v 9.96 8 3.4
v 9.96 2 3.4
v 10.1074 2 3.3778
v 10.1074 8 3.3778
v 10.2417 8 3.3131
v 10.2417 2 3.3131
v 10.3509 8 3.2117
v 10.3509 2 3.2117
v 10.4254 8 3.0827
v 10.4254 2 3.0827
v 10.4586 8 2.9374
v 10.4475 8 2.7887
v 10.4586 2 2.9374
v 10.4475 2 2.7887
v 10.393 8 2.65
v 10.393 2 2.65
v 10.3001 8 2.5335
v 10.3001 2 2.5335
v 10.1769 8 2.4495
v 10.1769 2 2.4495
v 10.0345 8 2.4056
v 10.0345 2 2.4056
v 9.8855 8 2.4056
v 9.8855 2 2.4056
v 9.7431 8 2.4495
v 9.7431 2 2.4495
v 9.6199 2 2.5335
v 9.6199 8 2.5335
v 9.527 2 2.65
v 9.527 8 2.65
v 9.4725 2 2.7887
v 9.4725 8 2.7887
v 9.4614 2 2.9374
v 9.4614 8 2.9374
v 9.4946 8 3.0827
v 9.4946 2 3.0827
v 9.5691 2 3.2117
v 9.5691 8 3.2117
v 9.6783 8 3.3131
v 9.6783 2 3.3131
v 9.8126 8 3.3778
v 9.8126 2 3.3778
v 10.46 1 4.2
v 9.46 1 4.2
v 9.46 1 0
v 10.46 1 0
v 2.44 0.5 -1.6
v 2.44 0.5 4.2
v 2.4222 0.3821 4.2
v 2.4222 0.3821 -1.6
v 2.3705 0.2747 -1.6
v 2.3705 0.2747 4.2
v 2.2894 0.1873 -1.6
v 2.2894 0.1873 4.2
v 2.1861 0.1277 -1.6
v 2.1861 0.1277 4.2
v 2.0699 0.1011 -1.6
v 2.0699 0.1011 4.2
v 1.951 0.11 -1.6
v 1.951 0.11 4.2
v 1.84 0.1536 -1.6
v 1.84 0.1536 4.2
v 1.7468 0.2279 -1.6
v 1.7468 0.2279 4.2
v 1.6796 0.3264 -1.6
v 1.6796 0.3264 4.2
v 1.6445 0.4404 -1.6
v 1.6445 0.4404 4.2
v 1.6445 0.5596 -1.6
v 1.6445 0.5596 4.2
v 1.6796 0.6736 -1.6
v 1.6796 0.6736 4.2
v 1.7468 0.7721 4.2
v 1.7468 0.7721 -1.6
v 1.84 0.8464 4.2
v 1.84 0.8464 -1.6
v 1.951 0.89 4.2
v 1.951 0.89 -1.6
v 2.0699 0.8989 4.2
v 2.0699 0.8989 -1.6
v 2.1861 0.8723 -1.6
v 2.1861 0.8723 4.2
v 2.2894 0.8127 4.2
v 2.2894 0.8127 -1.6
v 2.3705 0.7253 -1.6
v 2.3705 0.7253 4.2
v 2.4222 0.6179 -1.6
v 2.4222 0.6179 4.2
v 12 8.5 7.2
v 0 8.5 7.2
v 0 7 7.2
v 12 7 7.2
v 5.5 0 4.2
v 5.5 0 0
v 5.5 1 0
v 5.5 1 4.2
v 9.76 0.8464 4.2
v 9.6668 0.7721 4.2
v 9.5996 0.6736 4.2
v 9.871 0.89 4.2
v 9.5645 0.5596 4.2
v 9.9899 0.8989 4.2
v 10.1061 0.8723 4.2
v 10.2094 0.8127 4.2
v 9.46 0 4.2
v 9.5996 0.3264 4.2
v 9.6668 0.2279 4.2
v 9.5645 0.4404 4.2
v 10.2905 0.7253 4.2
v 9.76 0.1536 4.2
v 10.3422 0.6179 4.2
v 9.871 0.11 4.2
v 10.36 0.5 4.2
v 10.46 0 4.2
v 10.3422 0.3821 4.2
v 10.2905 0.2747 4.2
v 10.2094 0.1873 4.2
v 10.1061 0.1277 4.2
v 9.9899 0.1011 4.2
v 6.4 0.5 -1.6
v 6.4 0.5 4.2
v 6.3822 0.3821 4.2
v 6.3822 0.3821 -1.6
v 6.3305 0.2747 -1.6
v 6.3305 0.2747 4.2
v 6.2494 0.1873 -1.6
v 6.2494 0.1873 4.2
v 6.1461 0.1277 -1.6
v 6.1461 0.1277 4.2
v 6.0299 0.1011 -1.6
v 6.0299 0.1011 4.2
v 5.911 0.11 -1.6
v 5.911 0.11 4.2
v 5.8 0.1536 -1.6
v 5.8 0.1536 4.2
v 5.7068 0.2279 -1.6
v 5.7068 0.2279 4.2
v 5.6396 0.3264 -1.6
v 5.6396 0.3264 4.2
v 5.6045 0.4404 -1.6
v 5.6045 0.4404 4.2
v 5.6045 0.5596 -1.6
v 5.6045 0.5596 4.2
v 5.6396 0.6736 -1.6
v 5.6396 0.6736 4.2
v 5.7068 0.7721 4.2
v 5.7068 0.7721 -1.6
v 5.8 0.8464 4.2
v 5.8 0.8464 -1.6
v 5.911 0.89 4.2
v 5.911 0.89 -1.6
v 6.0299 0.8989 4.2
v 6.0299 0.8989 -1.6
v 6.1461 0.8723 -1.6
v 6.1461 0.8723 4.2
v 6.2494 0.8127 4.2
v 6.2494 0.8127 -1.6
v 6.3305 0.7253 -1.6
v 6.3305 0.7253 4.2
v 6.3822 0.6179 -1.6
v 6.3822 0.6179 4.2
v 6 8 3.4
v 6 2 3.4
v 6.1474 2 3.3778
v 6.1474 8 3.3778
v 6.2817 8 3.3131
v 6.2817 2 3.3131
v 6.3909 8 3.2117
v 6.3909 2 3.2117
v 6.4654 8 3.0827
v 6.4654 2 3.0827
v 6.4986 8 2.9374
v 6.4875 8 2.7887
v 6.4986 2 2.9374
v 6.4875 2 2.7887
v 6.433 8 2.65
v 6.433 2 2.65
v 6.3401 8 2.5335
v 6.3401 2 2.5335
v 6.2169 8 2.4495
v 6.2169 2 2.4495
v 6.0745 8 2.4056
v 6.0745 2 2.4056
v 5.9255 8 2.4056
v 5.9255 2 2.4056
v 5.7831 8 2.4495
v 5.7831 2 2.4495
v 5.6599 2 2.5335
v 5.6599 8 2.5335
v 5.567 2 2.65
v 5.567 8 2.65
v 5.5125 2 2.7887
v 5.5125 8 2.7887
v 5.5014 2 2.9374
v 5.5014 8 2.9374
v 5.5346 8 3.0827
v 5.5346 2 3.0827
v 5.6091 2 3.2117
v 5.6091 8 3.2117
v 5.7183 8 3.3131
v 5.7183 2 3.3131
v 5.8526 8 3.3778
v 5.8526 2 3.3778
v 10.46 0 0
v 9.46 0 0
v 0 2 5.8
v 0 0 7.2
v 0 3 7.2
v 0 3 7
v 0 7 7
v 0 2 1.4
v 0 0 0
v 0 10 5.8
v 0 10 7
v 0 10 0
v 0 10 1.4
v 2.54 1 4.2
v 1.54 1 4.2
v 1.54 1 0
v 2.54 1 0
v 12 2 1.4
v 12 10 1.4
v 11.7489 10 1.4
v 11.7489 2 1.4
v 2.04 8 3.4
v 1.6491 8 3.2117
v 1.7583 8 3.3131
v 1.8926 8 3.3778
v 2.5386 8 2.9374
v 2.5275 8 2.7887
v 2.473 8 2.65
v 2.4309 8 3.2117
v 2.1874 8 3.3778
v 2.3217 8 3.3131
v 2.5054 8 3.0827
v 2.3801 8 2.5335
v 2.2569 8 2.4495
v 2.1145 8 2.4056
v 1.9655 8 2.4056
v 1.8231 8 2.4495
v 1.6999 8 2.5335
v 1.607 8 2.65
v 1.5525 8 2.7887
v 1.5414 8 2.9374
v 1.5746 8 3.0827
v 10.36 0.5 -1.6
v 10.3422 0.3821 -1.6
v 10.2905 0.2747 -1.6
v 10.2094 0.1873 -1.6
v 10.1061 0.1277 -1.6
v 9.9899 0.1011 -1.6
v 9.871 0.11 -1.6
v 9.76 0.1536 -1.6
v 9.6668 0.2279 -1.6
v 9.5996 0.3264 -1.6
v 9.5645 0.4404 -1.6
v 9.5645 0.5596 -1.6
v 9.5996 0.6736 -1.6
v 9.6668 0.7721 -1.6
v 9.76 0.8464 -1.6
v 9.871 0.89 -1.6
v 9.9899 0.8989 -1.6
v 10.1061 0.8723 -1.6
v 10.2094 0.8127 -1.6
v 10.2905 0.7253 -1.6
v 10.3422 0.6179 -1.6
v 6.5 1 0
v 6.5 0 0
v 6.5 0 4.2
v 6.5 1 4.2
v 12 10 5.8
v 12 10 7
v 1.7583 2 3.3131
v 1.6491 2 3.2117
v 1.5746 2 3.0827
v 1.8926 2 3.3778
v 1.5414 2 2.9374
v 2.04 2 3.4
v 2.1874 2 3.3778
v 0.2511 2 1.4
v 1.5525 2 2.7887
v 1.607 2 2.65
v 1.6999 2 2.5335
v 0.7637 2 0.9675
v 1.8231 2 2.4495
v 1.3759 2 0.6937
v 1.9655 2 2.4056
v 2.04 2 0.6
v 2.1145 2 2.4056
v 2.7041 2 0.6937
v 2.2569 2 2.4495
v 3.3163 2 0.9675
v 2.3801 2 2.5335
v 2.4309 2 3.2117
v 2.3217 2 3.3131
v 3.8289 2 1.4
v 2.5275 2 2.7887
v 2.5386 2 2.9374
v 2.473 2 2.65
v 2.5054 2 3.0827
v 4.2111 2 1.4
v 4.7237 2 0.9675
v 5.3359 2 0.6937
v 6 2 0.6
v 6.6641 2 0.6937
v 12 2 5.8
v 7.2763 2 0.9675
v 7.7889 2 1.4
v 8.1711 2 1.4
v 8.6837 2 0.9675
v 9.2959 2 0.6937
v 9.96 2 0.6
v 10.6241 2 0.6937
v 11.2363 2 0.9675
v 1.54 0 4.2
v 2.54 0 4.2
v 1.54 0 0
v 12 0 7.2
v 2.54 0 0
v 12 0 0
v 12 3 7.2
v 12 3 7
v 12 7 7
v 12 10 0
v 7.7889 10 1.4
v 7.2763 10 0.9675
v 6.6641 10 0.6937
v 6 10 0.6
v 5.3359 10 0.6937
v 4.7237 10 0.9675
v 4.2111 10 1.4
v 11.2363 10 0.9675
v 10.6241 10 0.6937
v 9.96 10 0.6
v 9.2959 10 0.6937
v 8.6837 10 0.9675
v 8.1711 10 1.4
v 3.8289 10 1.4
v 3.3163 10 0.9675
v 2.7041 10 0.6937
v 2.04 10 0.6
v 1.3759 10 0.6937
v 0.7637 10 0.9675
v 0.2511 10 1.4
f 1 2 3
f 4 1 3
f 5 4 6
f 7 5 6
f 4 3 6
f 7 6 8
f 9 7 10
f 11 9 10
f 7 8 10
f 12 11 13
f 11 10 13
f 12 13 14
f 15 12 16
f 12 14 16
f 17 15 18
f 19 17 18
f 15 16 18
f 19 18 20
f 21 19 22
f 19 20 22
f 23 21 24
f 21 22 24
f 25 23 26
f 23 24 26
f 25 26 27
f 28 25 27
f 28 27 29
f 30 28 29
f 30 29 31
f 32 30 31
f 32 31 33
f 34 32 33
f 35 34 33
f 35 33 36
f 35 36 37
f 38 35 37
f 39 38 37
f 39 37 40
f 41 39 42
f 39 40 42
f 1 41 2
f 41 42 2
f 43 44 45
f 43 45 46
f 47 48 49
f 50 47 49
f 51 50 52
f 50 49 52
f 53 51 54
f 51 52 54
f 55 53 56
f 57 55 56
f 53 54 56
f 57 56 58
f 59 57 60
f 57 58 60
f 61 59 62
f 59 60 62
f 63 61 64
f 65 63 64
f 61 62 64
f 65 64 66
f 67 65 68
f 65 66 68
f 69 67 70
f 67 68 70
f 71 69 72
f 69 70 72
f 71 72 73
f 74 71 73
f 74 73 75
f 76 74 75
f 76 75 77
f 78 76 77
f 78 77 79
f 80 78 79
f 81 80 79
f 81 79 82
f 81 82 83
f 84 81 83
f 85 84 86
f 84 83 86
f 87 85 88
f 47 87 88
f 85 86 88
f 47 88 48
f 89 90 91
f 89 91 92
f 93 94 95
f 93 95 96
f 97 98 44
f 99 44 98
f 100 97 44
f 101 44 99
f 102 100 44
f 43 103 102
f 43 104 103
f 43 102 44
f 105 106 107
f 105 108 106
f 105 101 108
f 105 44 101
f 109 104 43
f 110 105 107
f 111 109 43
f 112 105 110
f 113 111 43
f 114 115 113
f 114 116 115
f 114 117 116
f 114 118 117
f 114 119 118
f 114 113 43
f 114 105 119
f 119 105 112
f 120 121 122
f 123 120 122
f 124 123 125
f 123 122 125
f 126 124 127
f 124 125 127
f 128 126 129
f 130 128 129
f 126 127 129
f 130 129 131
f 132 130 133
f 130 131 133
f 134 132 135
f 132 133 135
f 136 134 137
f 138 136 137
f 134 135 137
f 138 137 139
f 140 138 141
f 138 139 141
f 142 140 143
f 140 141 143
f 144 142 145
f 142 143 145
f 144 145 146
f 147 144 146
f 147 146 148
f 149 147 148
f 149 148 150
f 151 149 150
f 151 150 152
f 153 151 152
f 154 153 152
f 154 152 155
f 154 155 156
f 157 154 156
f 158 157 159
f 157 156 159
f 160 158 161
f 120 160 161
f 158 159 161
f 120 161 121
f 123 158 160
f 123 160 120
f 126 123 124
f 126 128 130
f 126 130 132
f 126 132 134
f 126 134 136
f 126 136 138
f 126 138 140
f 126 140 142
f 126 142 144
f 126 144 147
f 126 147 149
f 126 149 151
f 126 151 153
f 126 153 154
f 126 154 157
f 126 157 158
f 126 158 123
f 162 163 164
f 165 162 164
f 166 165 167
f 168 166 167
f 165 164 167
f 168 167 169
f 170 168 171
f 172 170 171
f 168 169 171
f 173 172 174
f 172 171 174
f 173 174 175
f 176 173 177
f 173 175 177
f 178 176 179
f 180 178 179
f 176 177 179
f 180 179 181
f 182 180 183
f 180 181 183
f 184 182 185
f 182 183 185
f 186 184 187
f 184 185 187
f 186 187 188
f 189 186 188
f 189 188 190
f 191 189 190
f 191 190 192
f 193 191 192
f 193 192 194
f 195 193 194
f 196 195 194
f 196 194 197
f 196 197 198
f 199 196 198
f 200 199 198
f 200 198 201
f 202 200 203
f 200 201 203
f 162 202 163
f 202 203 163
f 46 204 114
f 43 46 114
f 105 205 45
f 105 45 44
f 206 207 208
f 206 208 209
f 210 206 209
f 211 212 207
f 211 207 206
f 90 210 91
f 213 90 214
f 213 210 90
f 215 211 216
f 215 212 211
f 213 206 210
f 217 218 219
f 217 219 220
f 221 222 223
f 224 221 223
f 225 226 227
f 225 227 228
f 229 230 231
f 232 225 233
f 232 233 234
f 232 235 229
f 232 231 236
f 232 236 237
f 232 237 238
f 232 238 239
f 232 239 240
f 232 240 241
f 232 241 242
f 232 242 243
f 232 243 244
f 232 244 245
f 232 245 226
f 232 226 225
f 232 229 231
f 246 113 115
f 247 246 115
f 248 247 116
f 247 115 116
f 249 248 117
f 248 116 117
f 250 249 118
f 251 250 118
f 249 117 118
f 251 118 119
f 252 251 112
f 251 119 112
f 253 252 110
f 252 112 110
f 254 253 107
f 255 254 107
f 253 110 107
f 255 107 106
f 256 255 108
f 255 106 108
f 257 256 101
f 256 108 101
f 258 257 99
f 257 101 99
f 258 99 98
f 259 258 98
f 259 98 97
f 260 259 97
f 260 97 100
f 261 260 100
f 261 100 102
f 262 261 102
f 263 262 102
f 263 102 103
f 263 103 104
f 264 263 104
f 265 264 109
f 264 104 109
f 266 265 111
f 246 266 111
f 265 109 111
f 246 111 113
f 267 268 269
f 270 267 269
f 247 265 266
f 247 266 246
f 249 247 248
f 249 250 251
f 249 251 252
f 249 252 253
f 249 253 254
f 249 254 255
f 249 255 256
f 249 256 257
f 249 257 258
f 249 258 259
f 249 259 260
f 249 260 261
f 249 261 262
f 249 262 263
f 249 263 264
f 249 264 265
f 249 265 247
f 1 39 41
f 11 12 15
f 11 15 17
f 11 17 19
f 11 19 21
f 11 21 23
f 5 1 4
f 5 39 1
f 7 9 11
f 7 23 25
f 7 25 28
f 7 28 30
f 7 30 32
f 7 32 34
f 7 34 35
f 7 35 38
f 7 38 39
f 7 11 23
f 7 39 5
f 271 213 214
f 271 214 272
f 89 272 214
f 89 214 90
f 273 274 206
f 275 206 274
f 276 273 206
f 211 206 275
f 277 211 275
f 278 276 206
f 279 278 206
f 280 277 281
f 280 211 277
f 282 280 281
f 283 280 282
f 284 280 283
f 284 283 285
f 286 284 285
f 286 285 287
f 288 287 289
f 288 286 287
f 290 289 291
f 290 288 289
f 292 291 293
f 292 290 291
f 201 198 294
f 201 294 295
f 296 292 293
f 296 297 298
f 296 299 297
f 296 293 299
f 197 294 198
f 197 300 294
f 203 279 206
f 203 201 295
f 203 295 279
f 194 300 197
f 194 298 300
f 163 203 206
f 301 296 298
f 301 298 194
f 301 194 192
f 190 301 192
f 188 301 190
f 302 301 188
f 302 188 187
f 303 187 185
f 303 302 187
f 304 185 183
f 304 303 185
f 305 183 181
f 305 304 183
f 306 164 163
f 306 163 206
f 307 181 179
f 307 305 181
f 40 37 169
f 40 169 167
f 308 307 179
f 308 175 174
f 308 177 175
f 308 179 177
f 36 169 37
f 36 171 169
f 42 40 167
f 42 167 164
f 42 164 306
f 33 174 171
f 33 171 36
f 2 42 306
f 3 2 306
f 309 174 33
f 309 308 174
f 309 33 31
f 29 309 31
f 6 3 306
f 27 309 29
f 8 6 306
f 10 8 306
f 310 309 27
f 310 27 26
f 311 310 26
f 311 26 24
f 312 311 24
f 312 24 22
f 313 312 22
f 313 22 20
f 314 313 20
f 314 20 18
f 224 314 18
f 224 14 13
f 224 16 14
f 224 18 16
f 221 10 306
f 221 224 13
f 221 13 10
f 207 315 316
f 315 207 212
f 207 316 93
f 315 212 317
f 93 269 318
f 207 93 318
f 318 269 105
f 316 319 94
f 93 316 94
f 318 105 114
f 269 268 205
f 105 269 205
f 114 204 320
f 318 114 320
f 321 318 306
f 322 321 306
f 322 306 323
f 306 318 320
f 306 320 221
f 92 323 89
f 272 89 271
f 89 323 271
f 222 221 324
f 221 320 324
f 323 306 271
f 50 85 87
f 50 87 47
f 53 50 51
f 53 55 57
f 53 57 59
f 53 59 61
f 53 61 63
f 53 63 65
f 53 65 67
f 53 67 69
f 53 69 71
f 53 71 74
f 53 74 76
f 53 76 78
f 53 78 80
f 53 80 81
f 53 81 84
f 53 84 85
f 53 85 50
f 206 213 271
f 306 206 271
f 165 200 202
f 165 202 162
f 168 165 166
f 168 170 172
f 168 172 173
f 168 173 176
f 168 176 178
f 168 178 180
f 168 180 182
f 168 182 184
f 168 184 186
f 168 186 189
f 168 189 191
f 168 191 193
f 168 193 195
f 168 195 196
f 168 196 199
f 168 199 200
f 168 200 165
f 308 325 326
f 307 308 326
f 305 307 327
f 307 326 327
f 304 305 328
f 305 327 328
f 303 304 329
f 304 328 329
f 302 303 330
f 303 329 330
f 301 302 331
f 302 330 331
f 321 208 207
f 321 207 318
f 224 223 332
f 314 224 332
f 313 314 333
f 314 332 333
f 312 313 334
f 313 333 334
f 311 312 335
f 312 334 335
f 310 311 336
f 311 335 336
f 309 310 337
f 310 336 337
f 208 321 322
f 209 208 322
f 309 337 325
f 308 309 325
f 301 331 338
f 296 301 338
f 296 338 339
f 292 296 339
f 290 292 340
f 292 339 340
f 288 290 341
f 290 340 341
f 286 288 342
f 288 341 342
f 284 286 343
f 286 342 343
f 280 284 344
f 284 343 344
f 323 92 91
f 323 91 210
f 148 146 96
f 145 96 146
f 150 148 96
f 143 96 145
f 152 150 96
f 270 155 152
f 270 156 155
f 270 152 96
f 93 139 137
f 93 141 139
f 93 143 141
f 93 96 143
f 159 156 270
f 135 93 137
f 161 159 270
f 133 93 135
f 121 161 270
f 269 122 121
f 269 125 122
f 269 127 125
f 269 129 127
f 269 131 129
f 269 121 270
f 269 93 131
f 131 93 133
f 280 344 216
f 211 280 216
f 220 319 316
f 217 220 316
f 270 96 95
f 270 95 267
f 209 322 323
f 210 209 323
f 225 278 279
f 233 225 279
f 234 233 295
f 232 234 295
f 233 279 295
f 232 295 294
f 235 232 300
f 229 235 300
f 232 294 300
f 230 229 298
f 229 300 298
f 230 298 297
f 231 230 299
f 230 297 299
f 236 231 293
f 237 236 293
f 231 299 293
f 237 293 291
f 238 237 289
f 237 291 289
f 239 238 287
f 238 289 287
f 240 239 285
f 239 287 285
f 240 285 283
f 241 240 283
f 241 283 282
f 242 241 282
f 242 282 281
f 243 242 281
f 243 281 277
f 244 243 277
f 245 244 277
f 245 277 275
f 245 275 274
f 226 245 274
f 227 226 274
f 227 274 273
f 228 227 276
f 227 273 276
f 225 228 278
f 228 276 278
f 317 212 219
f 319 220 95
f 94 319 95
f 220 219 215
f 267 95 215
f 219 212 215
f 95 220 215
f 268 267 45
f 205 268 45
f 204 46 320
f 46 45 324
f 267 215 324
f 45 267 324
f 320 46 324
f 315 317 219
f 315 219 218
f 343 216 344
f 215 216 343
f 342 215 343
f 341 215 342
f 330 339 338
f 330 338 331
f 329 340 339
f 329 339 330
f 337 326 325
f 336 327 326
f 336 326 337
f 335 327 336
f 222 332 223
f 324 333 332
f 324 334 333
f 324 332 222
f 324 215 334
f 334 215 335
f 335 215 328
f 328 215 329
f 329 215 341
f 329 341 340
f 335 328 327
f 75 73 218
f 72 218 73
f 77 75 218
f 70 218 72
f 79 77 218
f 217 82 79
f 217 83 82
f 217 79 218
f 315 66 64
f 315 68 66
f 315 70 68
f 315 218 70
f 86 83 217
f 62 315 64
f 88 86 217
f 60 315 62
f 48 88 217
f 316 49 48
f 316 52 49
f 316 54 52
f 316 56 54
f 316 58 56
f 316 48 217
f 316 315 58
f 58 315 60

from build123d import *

# Parameters (mm, degrees)
SKETCH_1_W             = 12
SKETCH_1_H             = 10
EXTRUDE_1_DEPTH        = 7.2
SKETCH_2_W             = 1.17709233
SKETCH_2_H             = 4
CUT_EXTRUDE_1_DEPTH    = 18.2
CUT_EXTRUDE_2_DEPTH    = 18.2
SKETCH_4_W             = 1
SKETCH_4_H             = 4.2
CUT_EXTRUDE_3_DEPTH    = 1
PATTERN_LINEAR_1_COUNT = 2
PATTERN_LINEAR_1_PITCH = 3.96
PATTERN_LINEAR_2_COUNT = 2
PATTERN_LINEAR_2_PITCH = 3.96
SKETCH_5_R             = 0.4
EXTRUDE_3_DEPTH        = 5.8
PATTERN_LINEAR_3_COUNT = 3
PATTERN_LINEAR_3_PITCH = 3.96
CUT_EXTRUDE_4_DEPTH    = 8
SKETCH_7_R             = 0.5
EXTRUDE_4_DEPTH        = 6


with BuildPart() as part:
    # 草图1 → 凸台-拉伸1 (new body)
    with BuildSketch(Plane.XY):
        with Locations((6, 5)):
            Rectangle(SKETCH_1_W, SKETCH_1_H)
    extrude(amount=EXTRUDE_1_DEPTH)

    # 草图2 → 切除-拉伸1 (cut, through all)
    with BuildSketch(Plane(origin=(12, 0, 0), x_dir=(0, 0, -1), z_dir=(1, 0, 0))):
        with Locations((-7.588546165, 5)):
            Rectangle(SKETCH_2_W, SKETCH_2_H)
    extrude(amount=-CUT_EXTRUDE_1_DEPTH, mode=Mode.SUBTRACT)

    # 草图3 → 切除-拉伸2 (cut, through all)
    with BuildSketch(Plane(origin=(12, 0, 0), x_dir=(0, 0, -1), z_dir=(1, 0, 0))):
        Polygon((-7, 10), (-7.2, 8.5), (-7.2, 10), align=None)
    extrude(amount=-CUT_EXTRUDE_2_DEPTH, mode=Mode.SUBTRACT)

    # 草图4 → 切除-拉伸3 (cut)
    with BuildSketch(Plane.XZ):
        with Locations((6, 2.1)):
            Rectangle(SKETCH_4_W, SKETCH_4_H)
    cut_extrude_3 = extrude(amount=-CUT_EXTRUDE_3_DEPTH, mode=Mode.SUBTRACT)

    # 阵列(线性)1: 切除-拉伸3 ×2
    with Locations(*[(i * PATTERN_LINEAR_1_PITCH, 0, 0) for i in range(1, PATTERN_LINEAR_1_COUNT)]):
        add(cut_extrude_3, mode=Mode.SUBTRACT)

    # 阵列(线性)2: 切除-拉伸3 ×2
    with Locations(*[(-i * PATTERN_LINEAR_2_PITCH, 0, 0) for i in range(1, PATTERN_LINEAR_2_COUNT)]):
        add(cut_extrude_3, mode=Mode.SUBTRACT)

    # 草图5 → 凸台-拉伸3 (add)
    with BuildSketch(Plane(origin=(0, 0, 4.2), x_dir=(-1, 0, 0), z_dir=(0, 0, -1))):
        with Locations(Location((-2.04, 0.5, 0), (0, 0, 180))):
            Circle(SKETCH_5_R)
    extrude_3 = extrude(amount=EXTRUDE_3_DEPTH)

    # 阵列(线性)3: 凸台-拉伸3 ×3
    with Locations(*[(i * PATTERN_LINEAR_3_PITCH, 0, 0) for i in range(1, PATTERN_LINEAR_3_COUNT)]):
        add(extrude_3)

    # 草图6 → 切除-拉伸4 (cut)
    with BuildSketch(Plane(origin=(0, 10, 0), x_dir=(1, 0, 0), z_dir=(0, 1, 0))):
        with BuildLine():
            Line((0, -5.8), (12, -5.8))
            Line((12, -5.8), (12, -4.26427845))
            Line((12, -4.26427845), (12, -1.4))
            Line((12, -1.4), (11.748854382, -1.4))
            ThreePointArc((11.748854382, -1.4), (9.96, -0.6), (8.171145618, -1.4))
            Line((8.171145618, -1.4), (7.788854382, -1.4))
            ThreePointArc((7.788854382, -1.4), (6, -0.6), (4.211145618, -1.4))
            Line((4.211145618, -1.4), (3.828854382, -1.4))
            ThreePointArc((3.828854382, -1.4), (2.04, -0.6), (0.251145618, -1.4))
            Line((0.251145618, -1.4), (0, -1.4))
            Line((0, -1.4), (0, -5.8))
        make_face()
    extrude(amount=-CUT_EXTRUDE_4_DEPTH, mode=Mode.SUBTRACT)

    # 草图7 → 凸台-拉伸4 (add)
    with BuildSketch(Plane(origin=(0, 2, 0), x_dir=(-1, 0, 0), z_dir=(0, 1, 0))):
        with Locations(Location((-6, 2.9, 0), (0, 0, 90))):
            Circle(SKETCH_7_R)
        with Locations(Location((-9.96, 2.9, 0), (0, 0, 90))):
            Circle(SKETCH_7_R)
        with Locations(Location((-2.04, 2.9, 0), (0, 0, 90))):
            Circle(SKETCH_7_R)
    extrude(amount=EXTRUDE_4_DEPTH)


solid = part.part
